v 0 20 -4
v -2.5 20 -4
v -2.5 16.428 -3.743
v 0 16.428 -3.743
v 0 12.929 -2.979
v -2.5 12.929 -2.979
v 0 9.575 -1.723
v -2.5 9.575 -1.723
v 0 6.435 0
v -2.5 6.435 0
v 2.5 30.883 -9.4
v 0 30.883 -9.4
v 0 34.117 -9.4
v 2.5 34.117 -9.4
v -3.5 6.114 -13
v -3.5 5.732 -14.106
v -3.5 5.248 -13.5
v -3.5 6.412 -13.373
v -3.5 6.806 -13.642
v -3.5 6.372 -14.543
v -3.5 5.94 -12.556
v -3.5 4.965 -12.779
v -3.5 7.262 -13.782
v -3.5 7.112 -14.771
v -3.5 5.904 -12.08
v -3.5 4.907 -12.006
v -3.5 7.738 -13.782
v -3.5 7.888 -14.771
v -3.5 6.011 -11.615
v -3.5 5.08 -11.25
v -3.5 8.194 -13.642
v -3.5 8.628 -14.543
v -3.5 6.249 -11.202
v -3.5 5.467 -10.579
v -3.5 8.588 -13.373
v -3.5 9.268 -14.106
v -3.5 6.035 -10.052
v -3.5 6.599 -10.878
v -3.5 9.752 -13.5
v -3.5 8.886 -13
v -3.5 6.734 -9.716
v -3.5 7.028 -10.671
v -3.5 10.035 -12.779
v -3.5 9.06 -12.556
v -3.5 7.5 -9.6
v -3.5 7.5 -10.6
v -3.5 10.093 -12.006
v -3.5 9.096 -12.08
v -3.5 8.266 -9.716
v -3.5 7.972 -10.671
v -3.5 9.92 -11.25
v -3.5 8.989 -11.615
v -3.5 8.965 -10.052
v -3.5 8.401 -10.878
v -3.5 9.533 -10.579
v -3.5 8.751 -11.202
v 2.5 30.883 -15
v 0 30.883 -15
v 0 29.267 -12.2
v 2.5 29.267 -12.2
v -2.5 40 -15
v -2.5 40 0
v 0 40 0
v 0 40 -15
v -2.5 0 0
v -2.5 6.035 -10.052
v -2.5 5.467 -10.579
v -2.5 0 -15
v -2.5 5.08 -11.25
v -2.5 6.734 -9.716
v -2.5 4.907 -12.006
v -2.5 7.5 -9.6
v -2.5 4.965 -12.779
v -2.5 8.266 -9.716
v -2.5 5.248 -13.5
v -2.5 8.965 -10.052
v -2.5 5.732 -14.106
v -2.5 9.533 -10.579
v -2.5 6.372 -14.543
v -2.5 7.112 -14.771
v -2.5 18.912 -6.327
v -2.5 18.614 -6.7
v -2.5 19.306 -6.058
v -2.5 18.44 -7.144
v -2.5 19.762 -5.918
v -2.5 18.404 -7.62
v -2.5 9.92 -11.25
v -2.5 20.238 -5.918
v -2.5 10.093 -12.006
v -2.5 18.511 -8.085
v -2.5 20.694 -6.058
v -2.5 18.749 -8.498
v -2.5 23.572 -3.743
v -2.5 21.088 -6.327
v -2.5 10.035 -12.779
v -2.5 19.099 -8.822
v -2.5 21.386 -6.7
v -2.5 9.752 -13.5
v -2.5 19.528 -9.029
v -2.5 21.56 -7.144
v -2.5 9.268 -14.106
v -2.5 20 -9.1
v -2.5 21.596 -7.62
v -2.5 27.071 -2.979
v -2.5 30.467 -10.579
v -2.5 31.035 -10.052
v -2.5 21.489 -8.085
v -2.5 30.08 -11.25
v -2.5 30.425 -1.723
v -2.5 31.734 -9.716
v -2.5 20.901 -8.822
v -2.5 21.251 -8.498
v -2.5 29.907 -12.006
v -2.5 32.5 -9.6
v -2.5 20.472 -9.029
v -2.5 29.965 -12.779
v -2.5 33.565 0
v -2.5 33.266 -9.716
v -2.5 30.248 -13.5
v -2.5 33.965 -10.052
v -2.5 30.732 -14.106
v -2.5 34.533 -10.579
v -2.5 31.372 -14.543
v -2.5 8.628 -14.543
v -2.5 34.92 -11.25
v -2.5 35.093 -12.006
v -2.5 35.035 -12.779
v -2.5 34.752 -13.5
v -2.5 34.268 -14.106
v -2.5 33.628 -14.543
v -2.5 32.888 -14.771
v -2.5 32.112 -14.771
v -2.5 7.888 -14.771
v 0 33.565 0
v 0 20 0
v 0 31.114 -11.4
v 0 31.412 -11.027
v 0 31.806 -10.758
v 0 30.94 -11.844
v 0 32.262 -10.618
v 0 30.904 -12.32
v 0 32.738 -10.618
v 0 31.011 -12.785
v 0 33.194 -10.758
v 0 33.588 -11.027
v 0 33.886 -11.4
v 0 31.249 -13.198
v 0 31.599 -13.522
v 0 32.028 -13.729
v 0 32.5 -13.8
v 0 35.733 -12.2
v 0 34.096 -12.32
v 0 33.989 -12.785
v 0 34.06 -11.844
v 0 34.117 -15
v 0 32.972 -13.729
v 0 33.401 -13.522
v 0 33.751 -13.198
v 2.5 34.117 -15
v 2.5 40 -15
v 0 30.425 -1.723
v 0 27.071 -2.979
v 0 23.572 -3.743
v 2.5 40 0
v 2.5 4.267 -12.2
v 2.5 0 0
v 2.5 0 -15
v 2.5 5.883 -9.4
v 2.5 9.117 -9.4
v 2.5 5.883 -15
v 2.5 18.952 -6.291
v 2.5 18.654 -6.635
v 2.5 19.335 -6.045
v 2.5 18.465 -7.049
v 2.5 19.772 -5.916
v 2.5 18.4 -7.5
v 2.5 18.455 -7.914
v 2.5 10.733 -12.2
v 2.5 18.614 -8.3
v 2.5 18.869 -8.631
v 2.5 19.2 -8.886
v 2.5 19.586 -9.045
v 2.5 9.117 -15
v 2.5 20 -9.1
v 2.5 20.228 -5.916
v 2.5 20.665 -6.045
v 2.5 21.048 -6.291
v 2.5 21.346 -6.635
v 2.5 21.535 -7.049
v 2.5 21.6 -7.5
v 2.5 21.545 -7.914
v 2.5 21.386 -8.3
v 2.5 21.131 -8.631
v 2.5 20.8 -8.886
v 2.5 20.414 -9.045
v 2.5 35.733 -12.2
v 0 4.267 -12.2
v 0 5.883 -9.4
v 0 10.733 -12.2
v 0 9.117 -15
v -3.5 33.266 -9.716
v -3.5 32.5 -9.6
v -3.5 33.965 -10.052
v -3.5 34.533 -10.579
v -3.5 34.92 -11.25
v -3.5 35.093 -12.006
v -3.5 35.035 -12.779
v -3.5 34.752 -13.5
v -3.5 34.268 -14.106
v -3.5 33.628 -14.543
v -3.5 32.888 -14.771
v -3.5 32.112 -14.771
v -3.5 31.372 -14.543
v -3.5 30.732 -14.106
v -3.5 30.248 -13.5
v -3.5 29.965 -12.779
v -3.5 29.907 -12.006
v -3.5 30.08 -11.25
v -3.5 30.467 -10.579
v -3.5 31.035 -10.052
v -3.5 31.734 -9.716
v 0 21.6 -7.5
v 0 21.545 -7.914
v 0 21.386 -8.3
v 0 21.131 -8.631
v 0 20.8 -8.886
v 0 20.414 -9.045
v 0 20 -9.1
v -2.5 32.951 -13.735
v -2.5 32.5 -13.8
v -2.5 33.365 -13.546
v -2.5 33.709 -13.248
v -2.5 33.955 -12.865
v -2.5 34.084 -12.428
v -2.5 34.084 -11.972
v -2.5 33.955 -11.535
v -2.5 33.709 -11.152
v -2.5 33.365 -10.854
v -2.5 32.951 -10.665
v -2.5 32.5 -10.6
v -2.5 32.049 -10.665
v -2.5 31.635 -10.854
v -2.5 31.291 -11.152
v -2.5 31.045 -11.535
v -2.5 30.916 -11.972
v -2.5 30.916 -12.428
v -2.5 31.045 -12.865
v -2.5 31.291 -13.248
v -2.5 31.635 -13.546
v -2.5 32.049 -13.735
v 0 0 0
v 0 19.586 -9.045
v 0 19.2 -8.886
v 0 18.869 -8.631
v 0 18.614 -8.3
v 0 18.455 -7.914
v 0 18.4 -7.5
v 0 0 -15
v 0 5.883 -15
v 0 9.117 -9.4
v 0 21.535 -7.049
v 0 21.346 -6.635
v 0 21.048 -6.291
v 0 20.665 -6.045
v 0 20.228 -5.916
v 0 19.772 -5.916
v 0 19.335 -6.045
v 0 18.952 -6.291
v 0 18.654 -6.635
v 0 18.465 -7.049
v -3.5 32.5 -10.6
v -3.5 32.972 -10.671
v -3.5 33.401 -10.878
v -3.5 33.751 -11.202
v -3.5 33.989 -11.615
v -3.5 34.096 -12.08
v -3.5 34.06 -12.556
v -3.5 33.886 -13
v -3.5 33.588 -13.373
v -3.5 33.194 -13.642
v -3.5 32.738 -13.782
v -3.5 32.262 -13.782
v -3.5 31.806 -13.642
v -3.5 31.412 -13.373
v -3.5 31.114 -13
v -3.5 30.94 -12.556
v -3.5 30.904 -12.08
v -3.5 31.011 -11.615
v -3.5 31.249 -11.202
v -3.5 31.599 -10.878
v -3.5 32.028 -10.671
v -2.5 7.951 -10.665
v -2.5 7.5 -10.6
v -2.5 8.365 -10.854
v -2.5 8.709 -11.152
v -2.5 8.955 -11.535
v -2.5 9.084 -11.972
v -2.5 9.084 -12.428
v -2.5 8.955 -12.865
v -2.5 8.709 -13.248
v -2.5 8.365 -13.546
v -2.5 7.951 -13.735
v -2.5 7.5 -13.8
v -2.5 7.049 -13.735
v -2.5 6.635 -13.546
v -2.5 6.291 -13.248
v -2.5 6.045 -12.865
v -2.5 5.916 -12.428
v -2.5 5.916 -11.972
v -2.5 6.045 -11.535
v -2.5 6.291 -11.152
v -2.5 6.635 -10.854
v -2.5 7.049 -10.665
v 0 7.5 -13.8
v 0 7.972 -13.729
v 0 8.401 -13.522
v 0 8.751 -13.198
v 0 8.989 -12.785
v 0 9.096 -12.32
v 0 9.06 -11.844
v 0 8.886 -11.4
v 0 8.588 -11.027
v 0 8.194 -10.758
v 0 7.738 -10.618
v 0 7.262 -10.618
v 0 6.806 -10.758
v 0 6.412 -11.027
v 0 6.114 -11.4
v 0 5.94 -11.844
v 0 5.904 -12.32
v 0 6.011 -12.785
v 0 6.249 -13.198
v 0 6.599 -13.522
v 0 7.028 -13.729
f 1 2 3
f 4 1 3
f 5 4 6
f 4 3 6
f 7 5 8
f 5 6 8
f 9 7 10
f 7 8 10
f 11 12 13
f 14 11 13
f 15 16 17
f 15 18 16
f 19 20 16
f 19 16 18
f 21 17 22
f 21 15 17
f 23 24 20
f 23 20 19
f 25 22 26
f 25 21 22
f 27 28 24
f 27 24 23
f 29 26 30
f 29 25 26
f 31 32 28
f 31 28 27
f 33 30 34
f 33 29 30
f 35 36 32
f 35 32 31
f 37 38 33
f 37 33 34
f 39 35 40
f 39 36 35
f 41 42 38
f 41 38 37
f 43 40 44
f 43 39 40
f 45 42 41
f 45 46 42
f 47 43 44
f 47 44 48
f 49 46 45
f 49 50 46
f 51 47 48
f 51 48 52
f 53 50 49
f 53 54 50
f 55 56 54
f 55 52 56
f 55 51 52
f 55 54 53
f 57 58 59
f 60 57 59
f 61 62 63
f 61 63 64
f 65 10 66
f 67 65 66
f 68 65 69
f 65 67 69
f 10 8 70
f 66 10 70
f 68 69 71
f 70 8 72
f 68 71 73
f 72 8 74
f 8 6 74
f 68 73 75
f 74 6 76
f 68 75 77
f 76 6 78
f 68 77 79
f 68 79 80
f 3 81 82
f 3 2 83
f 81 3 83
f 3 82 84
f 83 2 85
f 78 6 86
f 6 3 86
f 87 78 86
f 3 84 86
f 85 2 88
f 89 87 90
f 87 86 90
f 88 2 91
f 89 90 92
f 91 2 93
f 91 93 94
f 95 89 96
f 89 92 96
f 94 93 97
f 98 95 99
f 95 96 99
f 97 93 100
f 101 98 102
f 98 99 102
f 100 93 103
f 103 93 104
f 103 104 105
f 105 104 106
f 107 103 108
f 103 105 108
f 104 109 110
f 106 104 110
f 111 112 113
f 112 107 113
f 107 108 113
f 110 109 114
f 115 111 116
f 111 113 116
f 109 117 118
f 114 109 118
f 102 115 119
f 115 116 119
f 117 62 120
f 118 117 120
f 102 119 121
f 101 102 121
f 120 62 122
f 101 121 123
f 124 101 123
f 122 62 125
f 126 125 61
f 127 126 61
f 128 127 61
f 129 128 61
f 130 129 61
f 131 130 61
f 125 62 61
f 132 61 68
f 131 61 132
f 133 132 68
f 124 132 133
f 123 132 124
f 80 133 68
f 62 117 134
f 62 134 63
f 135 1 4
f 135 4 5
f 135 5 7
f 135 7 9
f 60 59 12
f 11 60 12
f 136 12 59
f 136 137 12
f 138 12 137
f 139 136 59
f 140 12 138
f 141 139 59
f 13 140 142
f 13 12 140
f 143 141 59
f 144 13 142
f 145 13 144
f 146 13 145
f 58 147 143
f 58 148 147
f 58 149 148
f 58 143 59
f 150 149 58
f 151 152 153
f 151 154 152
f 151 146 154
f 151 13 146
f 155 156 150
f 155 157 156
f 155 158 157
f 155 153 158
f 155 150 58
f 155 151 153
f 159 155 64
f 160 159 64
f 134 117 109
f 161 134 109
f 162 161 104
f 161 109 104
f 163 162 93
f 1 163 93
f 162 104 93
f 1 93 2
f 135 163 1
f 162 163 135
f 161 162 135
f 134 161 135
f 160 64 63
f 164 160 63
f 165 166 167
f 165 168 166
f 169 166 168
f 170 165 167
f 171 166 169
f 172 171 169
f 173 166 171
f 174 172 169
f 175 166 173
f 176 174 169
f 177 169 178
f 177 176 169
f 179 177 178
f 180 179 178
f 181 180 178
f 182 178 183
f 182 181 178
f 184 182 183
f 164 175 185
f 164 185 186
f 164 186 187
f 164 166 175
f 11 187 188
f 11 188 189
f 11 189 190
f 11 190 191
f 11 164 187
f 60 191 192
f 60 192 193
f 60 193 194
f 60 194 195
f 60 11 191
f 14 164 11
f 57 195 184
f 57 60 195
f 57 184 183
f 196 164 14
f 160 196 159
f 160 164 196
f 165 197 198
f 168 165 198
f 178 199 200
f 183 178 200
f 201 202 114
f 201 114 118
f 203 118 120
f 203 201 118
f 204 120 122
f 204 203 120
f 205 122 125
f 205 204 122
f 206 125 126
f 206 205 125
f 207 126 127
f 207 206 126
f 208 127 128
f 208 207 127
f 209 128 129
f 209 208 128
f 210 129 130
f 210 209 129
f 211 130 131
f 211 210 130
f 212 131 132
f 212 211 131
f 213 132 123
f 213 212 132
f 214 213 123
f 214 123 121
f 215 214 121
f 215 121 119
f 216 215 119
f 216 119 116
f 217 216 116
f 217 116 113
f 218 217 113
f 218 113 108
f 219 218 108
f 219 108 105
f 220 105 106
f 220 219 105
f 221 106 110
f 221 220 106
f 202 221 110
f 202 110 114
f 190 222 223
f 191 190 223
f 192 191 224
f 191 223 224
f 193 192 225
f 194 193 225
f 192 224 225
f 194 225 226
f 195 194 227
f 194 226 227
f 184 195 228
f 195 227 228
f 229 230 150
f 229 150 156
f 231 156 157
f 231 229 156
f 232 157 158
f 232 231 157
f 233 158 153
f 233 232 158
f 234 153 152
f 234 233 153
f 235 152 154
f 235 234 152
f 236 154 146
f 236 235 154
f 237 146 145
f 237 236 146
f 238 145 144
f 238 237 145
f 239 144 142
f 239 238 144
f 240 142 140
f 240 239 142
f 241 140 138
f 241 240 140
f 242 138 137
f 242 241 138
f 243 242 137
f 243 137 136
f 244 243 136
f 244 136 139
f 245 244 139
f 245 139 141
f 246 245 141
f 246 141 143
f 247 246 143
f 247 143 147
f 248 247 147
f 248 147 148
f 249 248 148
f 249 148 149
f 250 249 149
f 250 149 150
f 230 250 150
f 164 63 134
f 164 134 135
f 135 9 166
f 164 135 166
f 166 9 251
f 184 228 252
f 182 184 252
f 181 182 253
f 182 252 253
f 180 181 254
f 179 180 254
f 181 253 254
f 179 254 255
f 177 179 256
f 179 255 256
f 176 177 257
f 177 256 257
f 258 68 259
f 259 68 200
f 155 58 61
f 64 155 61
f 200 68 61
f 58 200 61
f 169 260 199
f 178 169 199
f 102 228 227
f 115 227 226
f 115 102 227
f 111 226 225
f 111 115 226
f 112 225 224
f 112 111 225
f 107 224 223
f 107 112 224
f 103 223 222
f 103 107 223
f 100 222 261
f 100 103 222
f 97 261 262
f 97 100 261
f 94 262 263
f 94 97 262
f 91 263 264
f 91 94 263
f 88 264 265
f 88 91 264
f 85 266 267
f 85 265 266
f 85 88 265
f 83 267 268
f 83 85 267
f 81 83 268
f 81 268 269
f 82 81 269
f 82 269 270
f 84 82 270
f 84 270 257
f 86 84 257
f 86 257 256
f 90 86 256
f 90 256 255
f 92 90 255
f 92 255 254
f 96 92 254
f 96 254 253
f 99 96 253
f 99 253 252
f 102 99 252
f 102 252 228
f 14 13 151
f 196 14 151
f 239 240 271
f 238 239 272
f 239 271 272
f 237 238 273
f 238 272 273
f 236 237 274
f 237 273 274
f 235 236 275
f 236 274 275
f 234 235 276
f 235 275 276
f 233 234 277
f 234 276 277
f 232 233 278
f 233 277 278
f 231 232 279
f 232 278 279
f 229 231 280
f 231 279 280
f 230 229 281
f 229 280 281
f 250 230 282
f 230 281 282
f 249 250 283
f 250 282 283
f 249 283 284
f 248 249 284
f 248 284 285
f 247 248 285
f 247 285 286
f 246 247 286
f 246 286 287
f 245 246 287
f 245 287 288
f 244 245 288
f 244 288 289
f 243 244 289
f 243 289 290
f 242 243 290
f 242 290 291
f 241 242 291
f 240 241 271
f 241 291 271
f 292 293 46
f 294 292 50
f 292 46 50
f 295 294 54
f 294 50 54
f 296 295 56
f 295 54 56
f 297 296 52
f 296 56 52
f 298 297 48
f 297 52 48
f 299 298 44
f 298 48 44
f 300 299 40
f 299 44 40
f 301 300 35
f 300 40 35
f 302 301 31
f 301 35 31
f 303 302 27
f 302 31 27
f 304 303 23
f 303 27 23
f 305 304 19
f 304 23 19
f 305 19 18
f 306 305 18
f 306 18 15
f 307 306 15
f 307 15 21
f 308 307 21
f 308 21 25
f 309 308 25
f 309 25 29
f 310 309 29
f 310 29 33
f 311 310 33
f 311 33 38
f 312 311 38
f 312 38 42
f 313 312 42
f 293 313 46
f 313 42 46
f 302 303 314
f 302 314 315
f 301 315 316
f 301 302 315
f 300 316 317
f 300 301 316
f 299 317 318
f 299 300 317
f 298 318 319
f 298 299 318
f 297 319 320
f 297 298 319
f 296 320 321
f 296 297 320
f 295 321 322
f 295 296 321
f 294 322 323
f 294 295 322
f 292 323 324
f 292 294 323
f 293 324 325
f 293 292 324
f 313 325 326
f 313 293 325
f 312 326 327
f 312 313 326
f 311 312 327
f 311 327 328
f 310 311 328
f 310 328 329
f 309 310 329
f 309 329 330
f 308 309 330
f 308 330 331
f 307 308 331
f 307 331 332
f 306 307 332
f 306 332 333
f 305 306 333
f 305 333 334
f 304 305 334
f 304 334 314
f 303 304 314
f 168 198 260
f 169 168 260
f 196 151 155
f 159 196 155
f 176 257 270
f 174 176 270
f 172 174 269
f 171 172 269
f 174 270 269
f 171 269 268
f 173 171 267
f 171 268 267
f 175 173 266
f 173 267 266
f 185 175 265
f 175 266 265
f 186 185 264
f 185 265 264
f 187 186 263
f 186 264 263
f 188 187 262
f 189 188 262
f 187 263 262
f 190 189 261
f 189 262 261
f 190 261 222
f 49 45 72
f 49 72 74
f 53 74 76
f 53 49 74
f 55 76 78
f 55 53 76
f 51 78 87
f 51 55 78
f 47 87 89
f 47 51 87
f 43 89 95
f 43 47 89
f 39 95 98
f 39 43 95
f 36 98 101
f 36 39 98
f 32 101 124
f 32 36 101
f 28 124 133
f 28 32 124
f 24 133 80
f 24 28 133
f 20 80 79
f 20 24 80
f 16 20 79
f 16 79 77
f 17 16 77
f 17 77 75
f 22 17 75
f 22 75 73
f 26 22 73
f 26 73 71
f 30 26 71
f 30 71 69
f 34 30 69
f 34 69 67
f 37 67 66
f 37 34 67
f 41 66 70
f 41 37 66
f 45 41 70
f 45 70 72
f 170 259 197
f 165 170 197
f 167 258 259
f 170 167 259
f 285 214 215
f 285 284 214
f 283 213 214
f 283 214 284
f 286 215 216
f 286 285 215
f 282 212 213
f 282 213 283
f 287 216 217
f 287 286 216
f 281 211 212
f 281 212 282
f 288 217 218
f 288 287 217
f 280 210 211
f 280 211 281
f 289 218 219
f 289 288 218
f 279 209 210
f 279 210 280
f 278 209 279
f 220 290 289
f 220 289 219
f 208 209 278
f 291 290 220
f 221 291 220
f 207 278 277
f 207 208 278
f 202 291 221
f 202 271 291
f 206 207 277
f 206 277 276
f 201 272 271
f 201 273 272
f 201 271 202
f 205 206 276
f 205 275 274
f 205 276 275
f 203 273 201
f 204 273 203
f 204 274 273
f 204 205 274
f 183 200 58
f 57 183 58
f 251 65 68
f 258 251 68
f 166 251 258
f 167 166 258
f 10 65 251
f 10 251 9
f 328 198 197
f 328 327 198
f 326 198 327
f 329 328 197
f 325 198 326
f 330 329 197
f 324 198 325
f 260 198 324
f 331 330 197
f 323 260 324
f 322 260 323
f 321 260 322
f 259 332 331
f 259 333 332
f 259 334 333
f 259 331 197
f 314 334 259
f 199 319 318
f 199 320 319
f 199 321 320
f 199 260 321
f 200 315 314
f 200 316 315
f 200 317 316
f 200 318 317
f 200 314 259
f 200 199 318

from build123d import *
from build123d.topology import SkipClean

# Parameters (mm, degrees)
SKETCH1_R           = 1.6
BOSS_EXTRUDE1_DEPTH = 2.5
BOSS_EXTRUDE2_START = -2.5
SKETCH1_3_W         = 15
SKETCH1_3_H         = 40
SKETCH1_3_R         = 1.6
BOSS_EXTRUDE2_DEPTH = 2.5
EXTRUDE_THIN1_START = 1
SKETCH2_R           = 2.6
SKETCH2_R_2         = 1.6
EXTRUDE_THIN1_DEPTH = 1
CUT_EXTRUDE1_DEPTH  = 2.5


with BuildPart() as part:
    # Sketch1 → Boss-Extrude1 (new body)
    with BuildSketch(Plane(origin=(0, 0, 0), x_dir=(0, 0, -1), z_dir=(1, 0, 0))):
        Polygon((15, 40), (0, 40), (0, 0), (15, 0), (15, 5.883419246), (12.2, 4.266838493), (9.4, 5.883419246), (9.4, 9.116580754), (12.2, 10.733161507), (15, 9.116580754), (15, 30.883419246), (12.2, 29.266838493), (9.4, 30.883419246), (9.4, 34.116580754), (12.2, 35.733161507), (15, 34.116580754), align=None)
        with Locations((7.5, 20)):
            Circle(SKETCH1_R, mode=Mode.SUBTRACT)
    extrude(amount=BOSS_EXTRUDE1_DEPTH)

    # Sketch1<3> → Boss-Extrude2 (add)
    with BuildSketch(Plane(origin=(0, 0, 0), x_dir=(0, 0, -1), z_dir=(1, 0, 0)).offset(BOSS_EXTRUDE2_START)):
        with Locations((7.5, 20)):
            Rectangle(SKETCH1_3_W, SKETCH1_3_H)
        with Locations((7.5, 20)):
            Circle(SKETCH1_3_R, mode=Mode.SUBTRACT)
        with Locations((12.2, 32.5)):
            Circle(SKETCH1_3_R, mode=Mode.SUBTRACT)
        with Locations((12.2, 7.5)):
            Circle(SKETCH1_3_R, mode=Mode.SUBTRACT)
    extrude(amount=BOSS_EXTRUDE2_DEPTH)

    # Sketch2 → Extrude-Thin1 (add)
    # profile 1 of 2: a face of its own
    with SkipClean():  # the faces are left unmerged after this step: merging them gives an invalid solid
        with BuildSketch(Plane.ZY.offset(2.5).offset(EXTRUDE_THIN1_START)):
            with Locations((-12.2, 7.5)):
                Circle(SKETCH2_R)
            with Locations((-12.2, 7.5)):
                Circle(SKETCH2_R_2, mode=Mode.SUBTRACT)
        # profile 2 of 2: a face of its own
        with BuildSketch(Plane.ZY.offset(2.5).offset(EXTRUDE_THIN1_START)):
            with Locations((-12.2, 32.5)):
                Circle(SKETCH2_R)
            with Locations((-12.2, 32.5)):
                Circle(SKETCH2_R_2, mode=Mode.SUBTRACT)
        extrude(amount=-EXTRUDE_THIN1_DEPTH)

    # Sketch3 → Cut-Extrude1 (cut)
    with SkipClean():  # the faces are left unmerged after this step: merging them gives an invalid solid
        with BuildSketch(Plane.ZY.offset(2.5)):
            with BuildLine():
                ThreePointArc((0, 33.564659966), (-4, 20), (0, 6.435340034))
                Line((0, 6.435340034), (0, 33.564659966))
            make_face()
        extrude(amount=-CUT_EXTRUDE1_DEPTH, mode=Mode.SUBTRACT)


solid = part.part
